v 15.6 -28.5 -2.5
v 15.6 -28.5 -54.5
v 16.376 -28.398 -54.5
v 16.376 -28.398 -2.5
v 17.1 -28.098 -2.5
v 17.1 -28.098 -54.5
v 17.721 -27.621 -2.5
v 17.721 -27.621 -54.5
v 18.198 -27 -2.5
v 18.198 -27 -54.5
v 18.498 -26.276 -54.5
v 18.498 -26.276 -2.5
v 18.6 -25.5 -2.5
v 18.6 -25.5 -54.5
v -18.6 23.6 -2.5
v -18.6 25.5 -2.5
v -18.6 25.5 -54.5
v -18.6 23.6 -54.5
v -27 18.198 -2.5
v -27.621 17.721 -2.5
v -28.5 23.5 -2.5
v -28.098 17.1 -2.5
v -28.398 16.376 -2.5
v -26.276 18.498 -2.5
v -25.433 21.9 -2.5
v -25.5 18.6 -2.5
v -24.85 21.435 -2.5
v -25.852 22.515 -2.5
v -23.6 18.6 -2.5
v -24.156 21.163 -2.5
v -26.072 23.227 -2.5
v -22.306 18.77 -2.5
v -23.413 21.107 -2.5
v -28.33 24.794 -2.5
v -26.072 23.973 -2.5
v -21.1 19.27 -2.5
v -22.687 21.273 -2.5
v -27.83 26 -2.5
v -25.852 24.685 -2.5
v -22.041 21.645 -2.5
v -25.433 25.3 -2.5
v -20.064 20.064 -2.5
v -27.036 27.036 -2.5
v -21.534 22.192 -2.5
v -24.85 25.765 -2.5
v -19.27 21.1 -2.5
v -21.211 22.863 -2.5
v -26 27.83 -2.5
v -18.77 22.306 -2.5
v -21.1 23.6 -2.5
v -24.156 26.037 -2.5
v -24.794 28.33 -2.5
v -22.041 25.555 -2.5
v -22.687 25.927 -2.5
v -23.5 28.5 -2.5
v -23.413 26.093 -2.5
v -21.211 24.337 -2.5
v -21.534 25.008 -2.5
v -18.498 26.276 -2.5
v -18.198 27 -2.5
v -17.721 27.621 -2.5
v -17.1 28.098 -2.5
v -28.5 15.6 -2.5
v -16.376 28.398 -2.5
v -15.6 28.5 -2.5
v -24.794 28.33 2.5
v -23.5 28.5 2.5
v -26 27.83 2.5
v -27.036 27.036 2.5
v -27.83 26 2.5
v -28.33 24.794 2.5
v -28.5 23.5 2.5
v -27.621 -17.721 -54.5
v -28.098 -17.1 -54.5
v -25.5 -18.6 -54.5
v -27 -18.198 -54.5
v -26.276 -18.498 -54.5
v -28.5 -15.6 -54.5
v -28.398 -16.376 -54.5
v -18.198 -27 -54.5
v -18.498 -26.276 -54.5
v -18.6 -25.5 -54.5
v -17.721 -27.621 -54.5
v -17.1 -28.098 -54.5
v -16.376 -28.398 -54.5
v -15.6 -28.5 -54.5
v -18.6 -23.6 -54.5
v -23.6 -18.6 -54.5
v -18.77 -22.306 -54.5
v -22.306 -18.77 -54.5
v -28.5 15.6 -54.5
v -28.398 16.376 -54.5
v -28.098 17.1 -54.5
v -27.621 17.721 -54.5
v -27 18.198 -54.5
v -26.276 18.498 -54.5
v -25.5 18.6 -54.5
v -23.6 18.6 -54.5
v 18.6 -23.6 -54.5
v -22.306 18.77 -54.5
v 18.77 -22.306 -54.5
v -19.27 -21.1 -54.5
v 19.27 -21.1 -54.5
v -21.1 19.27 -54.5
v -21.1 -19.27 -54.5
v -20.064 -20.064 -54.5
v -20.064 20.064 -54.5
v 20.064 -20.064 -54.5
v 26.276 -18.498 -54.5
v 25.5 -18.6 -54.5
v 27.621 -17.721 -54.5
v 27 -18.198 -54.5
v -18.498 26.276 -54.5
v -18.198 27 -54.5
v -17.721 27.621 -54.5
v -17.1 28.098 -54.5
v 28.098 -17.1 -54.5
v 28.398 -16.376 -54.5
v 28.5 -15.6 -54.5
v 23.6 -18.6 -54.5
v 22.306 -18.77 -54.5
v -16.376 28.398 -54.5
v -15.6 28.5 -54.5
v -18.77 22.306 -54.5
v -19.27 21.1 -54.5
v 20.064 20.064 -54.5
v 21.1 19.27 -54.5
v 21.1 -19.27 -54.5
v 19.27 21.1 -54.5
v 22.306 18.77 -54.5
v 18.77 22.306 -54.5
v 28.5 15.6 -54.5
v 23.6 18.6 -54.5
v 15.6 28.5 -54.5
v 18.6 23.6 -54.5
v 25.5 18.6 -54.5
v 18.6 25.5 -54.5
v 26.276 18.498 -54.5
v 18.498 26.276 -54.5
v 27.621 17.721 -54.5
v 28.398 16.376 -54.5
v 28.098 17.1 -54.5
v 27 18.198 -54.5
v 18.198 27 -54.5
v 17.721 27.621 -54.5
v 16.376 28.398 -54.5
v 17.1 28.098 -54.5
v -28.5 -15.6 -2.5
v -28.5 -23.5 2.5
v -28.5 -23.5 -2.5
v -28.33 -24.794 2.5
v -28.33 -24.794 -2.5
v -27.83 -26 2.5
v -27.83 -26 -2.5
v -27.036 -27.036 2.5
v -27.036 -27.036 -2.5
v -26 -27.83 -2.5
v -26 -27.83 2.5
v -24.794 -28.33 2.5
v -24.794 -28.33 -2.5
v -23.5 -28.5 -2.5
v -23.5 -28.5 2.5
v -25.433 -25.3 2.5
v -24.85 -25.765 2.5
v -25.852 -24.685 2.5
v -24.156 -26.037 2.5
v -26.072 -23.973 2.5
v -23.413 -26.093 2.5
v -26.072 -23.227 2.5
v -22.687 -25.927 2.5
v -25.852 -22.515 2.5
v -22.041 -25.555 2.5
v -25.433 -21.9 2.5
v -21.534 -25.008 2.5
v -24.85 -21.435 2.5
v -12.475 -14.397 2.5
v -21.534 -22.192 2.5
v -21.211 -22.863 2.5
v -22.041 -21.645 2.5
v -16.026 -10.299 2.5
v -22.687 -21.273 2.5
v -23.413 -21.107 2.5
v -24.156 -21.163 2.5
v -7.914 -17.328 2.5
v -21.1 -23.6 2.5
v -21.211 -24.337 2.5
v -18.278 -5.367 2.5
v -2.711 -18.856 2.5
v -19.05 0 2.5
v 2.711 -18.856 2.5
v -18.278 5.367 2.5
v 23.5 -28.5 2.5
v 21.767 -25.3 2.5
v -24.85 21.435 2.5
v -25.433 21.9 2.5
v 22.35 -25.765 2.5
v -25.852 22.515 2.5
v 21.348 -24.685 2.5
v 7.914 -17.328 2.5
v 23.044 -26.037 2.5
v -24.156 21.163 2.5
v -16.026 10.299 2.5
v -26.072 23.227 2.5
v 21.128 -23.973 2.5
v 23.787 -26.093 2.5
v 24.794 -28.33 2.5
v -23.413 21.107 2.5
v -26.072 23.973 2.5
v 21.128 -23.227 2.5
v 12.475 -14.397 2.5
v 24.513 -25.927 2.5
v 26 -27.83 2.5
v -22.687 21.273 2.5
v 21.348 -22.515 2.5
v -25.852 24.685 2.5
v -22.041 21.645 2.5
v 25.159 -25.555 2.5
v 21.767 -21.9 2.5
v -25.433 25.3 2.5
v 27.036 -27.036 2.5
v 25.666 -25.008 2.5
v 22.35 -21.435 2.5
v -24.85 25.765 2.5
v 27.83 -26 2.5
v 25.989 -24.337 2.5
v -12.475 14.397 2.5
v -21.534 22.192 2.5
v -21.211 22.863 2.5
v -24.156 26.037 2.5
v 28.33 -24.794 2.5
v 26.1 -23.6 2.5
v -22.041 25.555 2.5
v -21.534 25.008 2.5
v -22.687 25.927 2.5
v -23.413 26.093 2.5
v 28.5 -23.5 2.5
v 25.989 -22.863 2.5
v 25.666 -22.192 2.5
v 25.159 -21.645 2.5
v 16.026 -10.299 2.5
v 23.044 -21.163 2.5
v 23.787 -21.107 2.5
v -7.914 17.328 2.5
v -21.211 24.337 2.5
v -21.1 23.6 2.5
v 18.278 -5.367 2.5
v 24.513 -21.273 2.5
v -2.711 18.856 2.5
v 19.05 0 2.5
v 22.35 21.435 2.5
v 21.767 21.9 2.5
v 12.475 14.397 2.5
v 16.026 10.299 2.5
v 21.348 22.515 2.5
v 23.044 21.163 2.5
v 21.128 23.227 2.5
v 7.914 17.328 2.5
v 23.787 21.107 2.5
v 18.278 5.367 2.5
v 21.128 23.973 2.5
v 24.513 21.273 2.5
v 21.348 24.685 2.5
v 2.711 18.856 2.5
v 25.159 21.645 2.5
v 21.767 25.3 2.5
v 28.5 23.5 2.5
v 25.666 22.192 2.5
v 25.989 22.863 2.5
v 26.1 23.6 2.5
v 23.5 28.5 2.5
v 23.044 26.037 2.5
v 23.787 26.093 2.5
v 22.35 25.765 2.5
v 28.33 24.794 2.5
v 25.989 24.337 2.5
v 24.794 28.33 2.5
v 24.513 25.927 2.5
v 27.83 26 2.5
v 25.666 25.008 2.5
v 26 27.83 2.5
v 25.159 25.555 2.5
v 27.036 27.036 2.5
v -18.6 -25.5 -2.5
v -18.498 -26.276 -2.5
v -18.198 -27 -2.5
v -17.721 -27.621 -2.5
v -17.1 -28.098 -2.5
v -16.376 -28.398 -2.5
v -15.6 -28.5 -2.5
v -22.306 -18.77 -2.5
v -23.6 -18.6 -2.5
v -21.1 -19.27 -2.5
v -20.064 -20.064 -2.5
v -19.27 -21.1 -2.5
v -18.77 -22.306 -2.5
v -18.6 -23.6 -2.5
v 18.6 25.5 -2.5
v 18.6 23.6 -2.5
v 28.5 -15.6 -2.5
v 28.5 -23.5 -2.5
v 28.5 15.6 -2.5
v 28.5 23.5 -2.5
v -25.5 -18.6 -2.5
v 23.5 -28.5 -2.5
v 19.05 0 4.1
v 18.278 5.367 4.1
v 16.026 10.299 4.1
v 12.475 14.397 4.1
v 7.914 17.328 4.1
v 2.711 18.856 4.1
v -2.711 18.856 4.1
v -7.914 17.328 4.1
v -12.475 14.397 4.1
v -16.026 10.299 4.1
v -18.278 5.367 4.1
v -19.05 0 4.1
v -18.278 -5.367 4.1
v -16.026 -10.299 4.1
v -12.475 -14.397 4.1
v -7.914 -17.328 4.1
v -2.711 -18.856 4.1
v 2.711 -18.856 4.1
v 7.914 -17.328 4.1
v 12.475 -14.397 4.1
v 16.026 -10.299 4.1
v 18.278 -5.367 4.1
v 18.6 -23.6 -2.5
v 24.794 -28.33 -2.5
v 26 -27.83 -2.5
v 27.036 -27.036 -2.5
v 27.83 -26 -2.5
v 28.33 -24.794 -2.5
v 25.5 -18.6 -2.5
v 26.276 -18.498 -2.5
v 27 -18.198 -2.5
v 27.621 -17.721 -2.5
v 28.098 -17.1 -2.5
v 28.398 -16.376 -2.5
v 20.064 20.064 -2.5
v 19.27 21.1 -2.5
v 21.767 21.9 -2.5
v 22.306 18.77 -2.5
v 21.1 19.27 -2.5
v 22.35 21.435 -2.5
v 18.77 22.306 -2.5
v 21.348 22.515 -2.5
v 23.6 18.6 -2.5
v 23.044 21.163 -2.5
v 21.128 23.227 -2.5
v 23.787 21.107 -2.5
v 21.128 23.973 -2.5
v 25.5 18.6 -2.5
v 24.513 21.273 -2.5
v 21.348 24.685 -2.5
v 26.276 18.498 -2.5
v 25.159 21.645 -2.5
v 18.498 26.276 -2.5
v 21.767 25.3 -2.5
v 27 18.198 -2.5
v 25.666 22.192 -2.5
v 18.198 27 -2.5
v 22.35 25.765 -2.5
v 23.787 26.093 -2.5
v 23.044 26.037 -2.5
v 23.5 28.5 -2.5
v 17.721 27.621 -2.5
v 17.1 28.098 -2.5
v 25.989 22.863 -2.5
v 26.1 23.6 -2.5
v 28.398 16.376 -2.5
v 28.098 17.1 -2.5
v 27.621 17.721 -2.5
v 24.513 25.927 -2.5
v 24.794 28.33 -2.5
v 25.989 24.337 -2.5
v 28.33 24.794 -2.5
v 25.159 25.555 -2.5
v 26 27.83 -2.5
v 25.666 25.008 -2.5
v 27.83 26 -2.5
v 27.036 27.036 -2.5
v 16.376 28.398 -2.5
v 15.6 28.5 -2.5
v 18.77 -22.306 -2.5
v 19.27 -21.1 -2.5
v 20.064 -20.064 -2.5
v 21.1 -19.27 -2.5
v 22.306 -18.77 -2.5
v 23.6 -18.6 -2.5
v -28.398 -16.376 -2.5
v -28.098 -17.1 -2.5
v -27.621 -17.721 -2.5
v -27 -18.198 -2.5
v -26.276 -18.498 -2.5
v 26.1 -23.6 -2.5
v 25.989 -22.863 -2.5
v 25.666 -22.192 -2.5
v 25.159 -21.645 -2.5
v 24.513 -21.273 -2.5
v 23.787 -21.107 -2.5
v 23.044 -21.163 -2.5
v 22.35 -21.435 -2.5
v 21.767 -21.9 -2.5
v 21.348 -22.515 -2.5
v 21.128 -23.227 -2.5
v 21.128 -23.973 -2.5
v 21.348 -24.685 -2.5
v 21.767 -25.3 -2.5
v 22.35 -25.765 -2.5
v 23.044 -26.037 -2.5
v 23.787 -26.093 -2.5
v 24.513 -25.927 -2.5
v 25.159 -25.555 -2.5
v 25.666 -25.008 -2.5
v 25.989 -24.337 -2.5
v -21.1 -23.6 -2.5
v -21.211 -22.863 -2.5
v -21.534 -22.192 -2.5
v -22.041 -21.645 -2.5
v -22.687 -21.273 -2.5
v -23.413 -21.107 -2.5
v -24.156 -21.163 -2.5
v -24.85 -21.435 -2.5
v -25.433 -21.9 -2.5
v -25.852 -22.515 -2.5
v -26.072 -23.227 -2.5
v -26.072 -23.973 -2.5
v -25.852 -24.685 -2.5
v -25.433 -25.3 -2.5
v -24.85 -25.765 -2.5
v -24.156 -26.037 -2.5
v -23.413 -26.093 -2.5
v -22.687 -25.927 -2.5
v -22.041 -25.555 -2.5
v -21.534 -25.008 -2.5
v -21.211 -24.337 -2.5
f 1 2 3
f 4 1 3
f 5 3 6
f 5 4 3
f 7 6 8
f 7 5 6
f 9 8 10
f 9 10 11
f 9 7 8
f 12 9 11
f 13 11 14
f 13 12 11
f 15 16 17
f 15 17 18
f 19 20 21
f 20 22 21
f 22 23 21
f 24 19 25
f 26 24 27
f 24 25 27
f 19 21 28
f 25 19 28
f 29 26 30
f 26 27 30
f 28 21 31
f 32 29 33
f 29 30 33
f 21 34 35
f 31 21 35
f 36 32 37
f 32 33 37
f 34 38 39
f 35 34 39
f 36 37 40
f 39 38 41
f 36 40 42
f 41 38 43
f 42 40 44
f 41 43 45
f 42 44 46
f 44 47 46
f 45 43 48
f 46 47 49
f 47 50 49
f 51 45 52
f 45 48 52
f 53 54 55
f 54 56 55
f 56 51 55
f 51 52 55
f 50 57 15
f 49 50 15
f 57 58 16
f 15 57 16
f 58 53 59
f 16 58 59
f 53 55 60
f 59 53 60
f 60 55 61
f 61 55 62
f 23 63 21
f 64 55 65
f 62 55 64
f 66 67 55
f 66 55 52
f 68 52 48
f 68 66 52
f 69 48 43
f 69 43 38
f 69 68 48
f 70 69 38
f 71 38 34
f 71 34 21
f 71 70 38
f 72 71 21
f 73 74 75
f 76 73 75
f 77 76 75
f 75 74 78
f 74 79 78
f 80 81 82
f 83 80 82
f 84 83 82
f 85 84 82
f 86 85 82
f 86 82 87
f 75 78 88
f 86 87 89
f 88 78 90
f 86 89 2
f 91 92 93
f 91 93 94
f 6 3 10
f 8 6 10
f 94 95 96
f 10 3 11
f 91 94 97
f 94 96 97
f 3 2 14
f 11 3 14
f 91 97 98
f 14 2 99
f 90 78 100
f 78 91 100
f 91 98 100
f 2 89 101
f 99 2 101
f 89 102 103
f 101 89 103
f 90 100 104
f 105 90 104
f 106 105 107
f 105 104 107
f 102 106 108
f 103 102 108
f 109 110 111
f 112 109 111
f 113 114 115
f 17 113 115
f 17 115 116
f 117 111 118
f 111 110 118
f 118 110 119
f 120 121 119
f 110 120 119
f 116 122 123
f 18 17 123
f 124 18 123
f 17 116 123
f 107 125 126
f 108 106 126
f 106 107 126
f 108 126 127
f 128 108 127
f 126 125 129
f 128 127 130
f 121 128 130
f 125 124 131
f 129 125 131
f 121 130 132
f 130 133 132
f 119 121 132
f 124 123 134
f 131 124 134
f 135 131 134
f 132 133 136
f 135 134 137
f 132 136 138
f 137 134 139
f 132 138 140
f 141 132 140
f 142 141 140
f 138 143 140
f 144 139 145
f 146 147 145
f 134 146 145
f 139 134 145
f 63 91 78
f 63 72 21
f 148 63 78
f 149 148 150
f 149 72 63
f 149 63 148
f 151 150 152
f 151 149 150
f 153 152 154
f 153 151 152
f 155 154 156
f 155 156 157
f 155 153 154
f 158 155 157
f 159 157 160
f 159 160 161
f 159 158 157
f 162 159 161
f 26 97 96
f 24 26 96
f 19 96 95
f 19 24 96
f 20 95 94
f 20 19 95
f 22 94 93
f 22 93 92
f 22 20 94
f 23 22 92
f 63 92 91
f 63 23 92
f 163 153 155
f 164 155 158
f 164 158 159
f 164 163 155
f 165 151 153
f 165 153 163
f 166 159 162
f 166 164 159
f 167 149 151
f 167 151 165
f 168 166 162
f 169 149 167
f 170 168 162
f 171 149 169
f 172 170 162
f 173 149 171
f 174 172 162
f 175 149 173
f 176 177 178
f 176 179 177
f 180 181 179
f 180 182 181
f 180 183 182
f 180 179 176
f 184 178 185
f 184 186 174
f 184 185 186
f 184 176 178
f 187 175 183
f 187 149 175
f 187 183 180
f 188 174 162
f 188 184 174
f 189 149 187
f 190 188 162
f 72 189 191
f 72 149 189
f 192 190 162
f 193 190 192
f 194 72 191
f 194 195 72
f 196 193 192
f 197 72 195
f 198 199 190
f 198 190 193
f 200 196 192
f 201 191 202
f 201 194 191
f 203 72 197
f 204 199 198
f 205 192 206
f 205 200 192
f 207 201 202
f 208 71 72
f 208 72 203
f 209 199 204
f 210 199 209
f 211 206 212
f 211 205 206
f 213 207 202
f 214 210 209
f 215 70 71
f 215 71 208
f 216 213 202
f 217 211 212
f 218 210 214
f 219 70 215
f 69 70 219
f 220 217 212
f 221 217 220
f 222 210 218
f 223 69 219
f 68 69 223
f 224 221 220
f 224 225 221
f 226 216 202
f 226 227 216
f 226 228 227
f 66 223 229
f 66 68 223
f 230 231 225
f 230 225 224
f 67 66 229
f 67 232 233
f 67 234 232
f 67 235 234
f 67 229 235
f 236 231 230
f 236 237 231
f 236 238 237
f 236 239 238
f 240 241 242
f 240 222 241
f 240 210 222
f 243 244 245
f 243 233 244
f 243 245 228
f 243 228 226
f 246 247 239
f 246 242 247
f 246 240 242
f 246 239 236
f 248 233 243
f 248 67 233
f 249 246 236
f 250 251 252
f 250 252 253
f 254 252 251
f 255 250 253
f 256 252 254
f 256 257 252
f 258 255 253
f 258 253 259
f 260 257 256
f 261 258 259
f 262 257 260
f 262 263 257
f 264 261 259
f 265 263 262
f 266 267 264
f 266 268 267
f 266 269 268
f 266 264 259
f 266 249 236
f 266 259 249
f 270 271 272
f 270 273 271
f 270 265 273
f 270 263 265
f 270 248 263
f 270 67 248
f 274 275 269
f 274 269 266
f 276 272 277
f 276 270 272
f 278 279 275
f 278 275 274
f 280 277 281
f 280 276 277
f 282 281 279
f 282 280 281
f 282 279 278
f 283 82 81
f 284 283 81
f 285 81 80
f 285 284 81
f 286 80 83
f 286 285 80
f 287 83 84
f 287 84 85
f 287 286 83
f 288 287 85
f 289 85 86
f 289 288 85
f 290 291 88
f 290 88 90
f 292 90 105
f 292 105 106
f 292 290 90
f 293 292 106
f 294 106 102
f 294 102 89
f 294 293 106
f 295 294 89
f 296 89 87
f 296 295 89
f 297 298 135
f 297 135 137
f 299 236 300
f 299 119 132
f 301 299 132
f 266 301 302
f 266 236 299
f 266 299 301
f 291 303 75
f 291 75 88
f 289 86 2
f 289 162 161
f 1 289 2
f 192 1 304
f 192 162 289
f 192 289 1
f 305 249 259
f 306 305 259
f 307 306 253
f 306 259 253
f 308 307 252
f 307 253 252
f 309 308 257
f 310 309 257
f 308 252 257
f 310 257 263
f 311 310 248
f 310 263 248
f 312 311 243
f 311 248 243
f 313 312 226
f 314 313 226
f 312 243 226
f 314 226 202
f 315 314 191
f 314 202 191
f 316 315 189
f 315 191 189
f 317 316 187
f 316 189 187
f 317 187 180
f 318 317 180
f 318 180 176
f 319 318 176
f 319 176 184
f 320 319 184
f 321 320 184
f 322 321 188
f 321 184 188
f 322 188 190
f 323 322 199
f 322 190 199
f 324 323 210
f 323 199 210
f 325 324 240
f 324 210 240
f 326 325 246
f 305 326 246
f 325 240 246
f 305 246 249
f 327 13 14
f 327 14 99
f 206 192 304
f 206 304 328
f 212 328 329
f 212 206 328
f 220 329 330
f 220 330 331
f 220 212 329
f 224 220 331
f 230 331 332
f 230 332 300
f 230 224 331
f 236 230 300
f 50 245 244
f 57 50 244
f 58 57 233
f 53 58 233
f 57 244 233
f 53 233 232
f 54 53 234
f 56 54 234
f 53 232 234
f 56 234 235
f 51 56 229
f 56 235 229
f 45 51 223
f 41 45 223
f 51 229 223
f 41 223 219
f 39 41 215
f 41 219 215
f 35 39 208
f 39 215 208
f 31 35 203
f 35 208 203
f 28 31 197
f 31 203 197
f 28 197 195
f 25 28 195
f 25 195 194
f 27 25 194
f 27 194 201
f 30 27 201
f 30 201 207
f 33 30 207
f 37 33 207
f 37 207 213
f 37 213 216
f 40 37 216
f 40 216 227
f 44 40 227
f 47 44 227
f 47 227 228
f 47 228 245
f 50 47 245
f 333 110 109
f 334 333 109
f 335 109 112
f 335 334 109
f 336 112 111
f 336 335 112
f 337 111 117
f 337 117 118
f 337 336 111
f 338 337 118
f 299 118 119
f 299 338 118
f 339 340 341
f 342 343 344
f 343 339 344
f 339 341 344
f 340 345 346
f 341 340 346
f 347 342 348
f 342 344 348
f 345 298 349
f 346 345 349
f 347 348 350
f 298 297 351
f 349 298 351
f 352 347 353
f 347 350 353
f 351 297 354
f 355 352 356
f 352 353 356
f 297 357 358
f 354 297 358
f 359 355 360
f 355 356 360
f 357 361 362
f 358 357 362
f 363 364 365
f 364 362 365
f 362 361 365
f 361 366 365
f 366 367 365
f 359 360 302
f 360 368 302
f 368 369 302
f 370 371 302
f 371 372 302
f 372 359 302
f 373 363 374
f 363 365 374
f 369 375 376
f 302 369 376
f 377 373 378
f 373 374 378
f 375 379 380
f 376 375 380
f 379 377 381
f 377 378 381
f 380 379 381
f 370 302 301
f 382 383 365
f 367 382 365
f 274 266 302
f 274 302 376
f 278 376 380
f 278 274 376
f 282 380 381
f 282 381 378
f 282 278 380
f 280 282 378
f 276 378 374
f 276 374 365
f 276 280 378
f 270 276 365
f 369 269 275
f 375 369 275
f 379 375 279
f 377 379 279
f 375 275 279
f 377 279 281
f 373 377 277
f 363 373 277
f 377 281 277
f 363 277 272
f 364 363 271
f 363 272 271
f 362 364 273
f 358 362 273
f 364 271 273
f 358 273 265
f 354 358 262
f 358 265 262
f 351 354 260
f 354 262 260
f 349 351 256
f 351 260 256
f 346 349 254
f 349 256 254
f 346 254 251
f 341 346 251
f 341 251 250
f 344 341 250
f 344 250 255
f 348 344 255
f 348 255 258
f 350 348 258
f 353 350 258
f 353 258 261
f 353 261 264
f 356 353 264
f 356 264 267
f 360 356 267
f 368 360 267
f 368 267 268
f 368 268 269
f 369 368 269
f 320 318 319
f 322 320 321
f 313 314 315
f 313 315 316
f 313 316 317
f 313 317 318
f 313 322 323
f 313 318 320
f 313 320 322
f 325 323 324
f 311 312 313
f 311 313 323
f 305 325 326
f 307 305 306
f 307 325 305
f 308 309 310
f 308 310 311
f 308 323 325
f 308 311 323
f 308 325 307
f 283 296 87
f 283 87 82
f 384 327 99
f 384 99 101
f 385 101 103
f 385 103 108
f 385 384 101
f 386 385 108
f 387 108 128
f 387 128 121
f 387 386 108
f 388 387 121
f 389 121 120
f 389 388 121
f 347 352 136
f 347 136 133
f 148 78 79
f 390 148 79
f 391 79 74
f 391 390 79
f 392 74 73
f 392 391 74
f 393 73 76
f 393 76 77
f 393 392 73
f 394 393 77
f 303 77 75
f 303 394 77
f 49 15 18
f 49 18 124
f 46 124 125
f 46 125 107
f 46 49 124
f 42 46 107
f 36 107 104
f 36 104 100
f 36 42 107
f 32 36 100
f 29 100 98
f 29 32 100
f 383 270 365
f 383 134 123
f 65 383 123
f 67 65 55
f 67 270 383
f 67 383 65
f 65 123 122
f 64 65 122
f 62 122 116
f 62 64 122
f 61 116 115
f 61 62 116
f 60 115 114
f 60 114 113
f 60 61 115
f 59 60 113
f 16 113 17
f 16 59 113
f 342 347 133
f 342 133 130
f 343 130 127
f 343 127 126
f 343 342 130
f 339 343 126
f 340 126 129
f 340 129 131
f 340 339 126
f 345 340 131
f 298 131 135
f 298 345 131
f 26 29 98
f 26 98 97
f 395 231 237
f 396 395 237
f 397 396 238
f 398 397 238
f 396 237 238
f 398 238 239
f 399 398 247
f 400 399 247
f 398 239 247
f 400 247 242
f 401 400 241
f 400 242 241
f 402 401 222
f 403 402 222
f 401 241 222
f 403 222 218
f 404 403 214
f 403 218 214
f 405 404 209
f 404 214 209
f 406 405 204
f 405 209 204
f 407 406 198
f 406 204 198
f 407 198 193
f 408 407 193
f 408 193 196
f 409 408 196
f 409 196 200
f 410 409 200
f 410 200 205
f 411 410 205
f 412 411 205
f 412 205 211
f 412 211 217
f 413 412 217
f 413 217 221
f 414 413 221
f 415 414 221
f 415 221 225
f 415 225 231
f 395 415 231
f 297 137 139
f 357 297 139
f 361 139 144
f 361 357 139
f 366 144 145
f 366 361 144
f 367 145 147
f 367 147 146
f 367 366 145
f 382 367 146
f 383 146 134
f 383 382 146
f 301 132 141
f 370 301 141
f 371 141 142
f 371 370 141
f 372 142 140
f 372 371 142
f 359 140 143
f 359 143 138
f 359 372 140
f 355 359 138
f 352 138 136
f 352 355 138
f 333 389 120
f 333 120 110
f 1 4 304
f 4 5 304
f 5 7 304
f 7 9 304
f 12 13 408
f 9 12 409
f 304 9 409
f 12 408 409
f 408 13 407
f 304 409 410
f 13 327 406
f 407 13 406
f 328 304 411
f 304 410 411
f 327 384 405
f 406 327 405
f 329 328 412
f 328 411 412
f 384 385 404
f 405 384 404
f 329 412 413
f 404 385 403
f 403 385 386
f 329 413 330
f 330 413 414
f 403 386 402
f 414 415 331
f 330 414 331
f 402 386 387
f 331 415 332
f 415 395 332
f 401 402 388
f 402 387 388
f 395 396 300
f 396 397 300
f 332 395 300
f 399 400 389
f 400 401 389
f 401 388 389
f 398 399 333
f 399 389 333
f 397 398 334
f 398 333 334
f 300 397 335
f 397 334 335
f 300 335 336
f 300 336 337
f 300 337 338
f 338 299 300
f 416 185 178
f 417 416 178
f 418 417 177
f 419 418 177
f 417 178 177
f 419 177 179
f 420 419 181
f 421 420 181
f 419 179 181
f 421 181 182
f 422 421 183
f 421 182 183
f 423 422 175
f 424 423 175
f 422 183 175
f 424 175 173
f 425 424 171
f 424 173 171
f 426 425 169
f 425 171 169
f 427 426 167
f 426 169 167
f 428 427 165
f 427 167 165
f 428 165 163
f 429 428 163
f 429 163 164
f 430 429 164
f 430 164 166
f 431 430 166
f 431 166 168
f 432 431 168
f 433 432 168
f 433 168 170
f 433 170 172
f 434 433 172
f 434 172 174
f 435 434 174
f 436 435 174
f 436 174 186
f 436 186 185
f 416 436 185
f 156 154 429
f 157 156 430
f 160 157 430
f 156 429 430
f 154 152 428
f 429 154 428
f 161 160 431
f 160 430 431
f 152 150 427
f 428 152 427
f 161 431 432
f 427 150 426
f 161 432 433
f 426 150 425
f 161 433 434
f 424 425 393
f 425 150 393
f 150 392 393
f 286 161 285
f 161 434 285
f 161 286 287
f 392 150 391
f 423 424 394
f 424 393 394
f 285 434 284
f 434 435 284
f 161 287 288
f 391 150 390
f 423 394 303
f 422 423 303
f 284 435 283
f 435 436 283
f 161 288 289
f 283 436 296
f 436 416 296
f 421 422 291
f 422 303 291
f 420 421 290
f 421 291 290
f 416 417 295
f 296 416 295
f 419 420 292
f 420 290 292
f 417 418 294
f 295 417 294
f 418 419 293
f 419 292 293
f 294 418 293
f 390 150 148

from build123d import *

# Parameters (mm, degrees)
BOSS_EXTRUDE1_DEPTH = 2.5
SKETCH5_R           = 2.5
CUT_EXTRUDE1_DEPTH  = 6
SKETCH3_R           = 19.05
BOSS_EXTRUDE3_DEPTH = 1.6
BODY_DEPTH          = 52


with BuildPart() as part:
    # Sketch1 → Boss-Extrude1 (new body, symmetric)
    with BuildSketch(Plane.XY):
        with BuildLine():
            Line((-23.5, -28.5), (23.5, -28.5))
            ThreePointArc((23.5, -28.5), (27.035533906, -27.035533906), (28.5, -23.5))
            Line((28.5, -23.5), (28.5, 23.5))
            ThreePointArc((28.5, 23.5), (27.035533906, 27.035533906), (23.5, 28.5))
            Line((23.5, 28.5), (-23.5, 28.5))
            ThreePointArc((-23.5, 28.5), (-27.035533906, 27.035533906), (-28.5, 23.5))
            Line((-28.5, 23.5), (-28.5, -23.5))
            ThreePointArc((-28.5, -23.5), (-27.035533906, -27.035533906), (-23.5, -28.5))
        make_face()
    extrude(amount=BOSS_EXTRUDE1_DEPTH, both=True)

    # Sketch5 → Cut-Extrude1 (cut, through all)
    with BuildSketch(Plane.XY.offset(2.5)):
        with Locations((-23.6, 23.6)):
            Circle(SKETCH5_R)
        with Locations((23.6, 23.6)):
            Circle(SKETCH5_R)
        with Locations((23.6, -23.6)):
            Circle(SKETCH5_R)
        with Locations((-23.6, -23.6)):
            Circle(SKETCH5_R)
    extrude(amount=-CUT_EXTRUDE1_DEPTH, mode=Mode.SUBTRACT)

    # Sketch3 → Boss-Extrude3 (add)
    with BuildSketch(Plane.XY.offset(2.5)):
        Circle(SKETCH3_R)
    extrude(amount=BOSS_EXTRUDE3_DEPTH)

    # Sketch4 → Body (add)
    with BuildSketch(Plane(origin=(0, 0, -2.5), x_dir=(-1, 0, 0), z_dir=(0, 0, -1))):
        with BuildLine():
            Line((-18.6, 23.6), (-18.6, 25.5))
            ThreePointArc((-18.6, 25.5), (-17.721320344, 27.621320344), (-15.6, 28.5))
            Line((-15.6, 28.5), (15.6, 28.5))
            ThreePointArc((15.6, 28.5), (17.721320344, 27.621320344), (18.6, 25.5))
            Line((18.6, 25.5), (18.6, 23.6))
            ThreePointArc((18.6, 23.6), (20.064466094, 20.064466094), (23.6, 18.6))
            Line((23.6, 18.6), (25.5, 18.6))
            ThreePointArc((25.5, 18.6), (27.621320344, 17.721320344), (28.5, 15.6))
            Line((28.5, 15.6), (28.5, -15.6))
            ThreePointArc((28.5, -15.6), (27.621320344, -17.721320344), (25.5, -18.6))
            Line((25.5, -18.6), (23.6, -18.6))
            ThreePointArc((23.6, -18.6), (20.064466094, -20.064466094), (18.6, -23.6))
            Line((18.6, -23.6), (18.6, -25.5))
            ThreePointArc((18.6, -25.5), (17.721320344, -27.621320344), (15.6, -28.5))
            Line((15.6, -28.5), (-15.6, -28.5))
            ThreePointArc((-15.6, -28.5), (-17.721320344, -27.621320344), (-18.6, -25.5))
            Line((-18.6, -25.5), (-18.6, -23.6))
            ThreePointArc((-18.6, -23.6), (-20.064466094, -20.064466094), (-23.6, -18.6))
            Line((-23.6, -18.6), (-25.5, -18.6))
            ThreePointArc((-25.5, -18.6), (-27.621320344, -17.721320344), (-28.5, -15.6))
            Line((-28.5, -15.6), (-28.5, 15.6))
            ThreePointArc((-28.5, 15.6), (-27.621320344, 17.721320344), (-25.5, 18.6))
            Line((-25.5, 18.6), (-23.6, 18.6))
            ThreePointArc((-23.6, 18.6), (-20.064466094, 20.064466094), (-18.6, 23.6))
        make_face()
    extrude(amount=BODY_DEPTH)


solid = part.part
